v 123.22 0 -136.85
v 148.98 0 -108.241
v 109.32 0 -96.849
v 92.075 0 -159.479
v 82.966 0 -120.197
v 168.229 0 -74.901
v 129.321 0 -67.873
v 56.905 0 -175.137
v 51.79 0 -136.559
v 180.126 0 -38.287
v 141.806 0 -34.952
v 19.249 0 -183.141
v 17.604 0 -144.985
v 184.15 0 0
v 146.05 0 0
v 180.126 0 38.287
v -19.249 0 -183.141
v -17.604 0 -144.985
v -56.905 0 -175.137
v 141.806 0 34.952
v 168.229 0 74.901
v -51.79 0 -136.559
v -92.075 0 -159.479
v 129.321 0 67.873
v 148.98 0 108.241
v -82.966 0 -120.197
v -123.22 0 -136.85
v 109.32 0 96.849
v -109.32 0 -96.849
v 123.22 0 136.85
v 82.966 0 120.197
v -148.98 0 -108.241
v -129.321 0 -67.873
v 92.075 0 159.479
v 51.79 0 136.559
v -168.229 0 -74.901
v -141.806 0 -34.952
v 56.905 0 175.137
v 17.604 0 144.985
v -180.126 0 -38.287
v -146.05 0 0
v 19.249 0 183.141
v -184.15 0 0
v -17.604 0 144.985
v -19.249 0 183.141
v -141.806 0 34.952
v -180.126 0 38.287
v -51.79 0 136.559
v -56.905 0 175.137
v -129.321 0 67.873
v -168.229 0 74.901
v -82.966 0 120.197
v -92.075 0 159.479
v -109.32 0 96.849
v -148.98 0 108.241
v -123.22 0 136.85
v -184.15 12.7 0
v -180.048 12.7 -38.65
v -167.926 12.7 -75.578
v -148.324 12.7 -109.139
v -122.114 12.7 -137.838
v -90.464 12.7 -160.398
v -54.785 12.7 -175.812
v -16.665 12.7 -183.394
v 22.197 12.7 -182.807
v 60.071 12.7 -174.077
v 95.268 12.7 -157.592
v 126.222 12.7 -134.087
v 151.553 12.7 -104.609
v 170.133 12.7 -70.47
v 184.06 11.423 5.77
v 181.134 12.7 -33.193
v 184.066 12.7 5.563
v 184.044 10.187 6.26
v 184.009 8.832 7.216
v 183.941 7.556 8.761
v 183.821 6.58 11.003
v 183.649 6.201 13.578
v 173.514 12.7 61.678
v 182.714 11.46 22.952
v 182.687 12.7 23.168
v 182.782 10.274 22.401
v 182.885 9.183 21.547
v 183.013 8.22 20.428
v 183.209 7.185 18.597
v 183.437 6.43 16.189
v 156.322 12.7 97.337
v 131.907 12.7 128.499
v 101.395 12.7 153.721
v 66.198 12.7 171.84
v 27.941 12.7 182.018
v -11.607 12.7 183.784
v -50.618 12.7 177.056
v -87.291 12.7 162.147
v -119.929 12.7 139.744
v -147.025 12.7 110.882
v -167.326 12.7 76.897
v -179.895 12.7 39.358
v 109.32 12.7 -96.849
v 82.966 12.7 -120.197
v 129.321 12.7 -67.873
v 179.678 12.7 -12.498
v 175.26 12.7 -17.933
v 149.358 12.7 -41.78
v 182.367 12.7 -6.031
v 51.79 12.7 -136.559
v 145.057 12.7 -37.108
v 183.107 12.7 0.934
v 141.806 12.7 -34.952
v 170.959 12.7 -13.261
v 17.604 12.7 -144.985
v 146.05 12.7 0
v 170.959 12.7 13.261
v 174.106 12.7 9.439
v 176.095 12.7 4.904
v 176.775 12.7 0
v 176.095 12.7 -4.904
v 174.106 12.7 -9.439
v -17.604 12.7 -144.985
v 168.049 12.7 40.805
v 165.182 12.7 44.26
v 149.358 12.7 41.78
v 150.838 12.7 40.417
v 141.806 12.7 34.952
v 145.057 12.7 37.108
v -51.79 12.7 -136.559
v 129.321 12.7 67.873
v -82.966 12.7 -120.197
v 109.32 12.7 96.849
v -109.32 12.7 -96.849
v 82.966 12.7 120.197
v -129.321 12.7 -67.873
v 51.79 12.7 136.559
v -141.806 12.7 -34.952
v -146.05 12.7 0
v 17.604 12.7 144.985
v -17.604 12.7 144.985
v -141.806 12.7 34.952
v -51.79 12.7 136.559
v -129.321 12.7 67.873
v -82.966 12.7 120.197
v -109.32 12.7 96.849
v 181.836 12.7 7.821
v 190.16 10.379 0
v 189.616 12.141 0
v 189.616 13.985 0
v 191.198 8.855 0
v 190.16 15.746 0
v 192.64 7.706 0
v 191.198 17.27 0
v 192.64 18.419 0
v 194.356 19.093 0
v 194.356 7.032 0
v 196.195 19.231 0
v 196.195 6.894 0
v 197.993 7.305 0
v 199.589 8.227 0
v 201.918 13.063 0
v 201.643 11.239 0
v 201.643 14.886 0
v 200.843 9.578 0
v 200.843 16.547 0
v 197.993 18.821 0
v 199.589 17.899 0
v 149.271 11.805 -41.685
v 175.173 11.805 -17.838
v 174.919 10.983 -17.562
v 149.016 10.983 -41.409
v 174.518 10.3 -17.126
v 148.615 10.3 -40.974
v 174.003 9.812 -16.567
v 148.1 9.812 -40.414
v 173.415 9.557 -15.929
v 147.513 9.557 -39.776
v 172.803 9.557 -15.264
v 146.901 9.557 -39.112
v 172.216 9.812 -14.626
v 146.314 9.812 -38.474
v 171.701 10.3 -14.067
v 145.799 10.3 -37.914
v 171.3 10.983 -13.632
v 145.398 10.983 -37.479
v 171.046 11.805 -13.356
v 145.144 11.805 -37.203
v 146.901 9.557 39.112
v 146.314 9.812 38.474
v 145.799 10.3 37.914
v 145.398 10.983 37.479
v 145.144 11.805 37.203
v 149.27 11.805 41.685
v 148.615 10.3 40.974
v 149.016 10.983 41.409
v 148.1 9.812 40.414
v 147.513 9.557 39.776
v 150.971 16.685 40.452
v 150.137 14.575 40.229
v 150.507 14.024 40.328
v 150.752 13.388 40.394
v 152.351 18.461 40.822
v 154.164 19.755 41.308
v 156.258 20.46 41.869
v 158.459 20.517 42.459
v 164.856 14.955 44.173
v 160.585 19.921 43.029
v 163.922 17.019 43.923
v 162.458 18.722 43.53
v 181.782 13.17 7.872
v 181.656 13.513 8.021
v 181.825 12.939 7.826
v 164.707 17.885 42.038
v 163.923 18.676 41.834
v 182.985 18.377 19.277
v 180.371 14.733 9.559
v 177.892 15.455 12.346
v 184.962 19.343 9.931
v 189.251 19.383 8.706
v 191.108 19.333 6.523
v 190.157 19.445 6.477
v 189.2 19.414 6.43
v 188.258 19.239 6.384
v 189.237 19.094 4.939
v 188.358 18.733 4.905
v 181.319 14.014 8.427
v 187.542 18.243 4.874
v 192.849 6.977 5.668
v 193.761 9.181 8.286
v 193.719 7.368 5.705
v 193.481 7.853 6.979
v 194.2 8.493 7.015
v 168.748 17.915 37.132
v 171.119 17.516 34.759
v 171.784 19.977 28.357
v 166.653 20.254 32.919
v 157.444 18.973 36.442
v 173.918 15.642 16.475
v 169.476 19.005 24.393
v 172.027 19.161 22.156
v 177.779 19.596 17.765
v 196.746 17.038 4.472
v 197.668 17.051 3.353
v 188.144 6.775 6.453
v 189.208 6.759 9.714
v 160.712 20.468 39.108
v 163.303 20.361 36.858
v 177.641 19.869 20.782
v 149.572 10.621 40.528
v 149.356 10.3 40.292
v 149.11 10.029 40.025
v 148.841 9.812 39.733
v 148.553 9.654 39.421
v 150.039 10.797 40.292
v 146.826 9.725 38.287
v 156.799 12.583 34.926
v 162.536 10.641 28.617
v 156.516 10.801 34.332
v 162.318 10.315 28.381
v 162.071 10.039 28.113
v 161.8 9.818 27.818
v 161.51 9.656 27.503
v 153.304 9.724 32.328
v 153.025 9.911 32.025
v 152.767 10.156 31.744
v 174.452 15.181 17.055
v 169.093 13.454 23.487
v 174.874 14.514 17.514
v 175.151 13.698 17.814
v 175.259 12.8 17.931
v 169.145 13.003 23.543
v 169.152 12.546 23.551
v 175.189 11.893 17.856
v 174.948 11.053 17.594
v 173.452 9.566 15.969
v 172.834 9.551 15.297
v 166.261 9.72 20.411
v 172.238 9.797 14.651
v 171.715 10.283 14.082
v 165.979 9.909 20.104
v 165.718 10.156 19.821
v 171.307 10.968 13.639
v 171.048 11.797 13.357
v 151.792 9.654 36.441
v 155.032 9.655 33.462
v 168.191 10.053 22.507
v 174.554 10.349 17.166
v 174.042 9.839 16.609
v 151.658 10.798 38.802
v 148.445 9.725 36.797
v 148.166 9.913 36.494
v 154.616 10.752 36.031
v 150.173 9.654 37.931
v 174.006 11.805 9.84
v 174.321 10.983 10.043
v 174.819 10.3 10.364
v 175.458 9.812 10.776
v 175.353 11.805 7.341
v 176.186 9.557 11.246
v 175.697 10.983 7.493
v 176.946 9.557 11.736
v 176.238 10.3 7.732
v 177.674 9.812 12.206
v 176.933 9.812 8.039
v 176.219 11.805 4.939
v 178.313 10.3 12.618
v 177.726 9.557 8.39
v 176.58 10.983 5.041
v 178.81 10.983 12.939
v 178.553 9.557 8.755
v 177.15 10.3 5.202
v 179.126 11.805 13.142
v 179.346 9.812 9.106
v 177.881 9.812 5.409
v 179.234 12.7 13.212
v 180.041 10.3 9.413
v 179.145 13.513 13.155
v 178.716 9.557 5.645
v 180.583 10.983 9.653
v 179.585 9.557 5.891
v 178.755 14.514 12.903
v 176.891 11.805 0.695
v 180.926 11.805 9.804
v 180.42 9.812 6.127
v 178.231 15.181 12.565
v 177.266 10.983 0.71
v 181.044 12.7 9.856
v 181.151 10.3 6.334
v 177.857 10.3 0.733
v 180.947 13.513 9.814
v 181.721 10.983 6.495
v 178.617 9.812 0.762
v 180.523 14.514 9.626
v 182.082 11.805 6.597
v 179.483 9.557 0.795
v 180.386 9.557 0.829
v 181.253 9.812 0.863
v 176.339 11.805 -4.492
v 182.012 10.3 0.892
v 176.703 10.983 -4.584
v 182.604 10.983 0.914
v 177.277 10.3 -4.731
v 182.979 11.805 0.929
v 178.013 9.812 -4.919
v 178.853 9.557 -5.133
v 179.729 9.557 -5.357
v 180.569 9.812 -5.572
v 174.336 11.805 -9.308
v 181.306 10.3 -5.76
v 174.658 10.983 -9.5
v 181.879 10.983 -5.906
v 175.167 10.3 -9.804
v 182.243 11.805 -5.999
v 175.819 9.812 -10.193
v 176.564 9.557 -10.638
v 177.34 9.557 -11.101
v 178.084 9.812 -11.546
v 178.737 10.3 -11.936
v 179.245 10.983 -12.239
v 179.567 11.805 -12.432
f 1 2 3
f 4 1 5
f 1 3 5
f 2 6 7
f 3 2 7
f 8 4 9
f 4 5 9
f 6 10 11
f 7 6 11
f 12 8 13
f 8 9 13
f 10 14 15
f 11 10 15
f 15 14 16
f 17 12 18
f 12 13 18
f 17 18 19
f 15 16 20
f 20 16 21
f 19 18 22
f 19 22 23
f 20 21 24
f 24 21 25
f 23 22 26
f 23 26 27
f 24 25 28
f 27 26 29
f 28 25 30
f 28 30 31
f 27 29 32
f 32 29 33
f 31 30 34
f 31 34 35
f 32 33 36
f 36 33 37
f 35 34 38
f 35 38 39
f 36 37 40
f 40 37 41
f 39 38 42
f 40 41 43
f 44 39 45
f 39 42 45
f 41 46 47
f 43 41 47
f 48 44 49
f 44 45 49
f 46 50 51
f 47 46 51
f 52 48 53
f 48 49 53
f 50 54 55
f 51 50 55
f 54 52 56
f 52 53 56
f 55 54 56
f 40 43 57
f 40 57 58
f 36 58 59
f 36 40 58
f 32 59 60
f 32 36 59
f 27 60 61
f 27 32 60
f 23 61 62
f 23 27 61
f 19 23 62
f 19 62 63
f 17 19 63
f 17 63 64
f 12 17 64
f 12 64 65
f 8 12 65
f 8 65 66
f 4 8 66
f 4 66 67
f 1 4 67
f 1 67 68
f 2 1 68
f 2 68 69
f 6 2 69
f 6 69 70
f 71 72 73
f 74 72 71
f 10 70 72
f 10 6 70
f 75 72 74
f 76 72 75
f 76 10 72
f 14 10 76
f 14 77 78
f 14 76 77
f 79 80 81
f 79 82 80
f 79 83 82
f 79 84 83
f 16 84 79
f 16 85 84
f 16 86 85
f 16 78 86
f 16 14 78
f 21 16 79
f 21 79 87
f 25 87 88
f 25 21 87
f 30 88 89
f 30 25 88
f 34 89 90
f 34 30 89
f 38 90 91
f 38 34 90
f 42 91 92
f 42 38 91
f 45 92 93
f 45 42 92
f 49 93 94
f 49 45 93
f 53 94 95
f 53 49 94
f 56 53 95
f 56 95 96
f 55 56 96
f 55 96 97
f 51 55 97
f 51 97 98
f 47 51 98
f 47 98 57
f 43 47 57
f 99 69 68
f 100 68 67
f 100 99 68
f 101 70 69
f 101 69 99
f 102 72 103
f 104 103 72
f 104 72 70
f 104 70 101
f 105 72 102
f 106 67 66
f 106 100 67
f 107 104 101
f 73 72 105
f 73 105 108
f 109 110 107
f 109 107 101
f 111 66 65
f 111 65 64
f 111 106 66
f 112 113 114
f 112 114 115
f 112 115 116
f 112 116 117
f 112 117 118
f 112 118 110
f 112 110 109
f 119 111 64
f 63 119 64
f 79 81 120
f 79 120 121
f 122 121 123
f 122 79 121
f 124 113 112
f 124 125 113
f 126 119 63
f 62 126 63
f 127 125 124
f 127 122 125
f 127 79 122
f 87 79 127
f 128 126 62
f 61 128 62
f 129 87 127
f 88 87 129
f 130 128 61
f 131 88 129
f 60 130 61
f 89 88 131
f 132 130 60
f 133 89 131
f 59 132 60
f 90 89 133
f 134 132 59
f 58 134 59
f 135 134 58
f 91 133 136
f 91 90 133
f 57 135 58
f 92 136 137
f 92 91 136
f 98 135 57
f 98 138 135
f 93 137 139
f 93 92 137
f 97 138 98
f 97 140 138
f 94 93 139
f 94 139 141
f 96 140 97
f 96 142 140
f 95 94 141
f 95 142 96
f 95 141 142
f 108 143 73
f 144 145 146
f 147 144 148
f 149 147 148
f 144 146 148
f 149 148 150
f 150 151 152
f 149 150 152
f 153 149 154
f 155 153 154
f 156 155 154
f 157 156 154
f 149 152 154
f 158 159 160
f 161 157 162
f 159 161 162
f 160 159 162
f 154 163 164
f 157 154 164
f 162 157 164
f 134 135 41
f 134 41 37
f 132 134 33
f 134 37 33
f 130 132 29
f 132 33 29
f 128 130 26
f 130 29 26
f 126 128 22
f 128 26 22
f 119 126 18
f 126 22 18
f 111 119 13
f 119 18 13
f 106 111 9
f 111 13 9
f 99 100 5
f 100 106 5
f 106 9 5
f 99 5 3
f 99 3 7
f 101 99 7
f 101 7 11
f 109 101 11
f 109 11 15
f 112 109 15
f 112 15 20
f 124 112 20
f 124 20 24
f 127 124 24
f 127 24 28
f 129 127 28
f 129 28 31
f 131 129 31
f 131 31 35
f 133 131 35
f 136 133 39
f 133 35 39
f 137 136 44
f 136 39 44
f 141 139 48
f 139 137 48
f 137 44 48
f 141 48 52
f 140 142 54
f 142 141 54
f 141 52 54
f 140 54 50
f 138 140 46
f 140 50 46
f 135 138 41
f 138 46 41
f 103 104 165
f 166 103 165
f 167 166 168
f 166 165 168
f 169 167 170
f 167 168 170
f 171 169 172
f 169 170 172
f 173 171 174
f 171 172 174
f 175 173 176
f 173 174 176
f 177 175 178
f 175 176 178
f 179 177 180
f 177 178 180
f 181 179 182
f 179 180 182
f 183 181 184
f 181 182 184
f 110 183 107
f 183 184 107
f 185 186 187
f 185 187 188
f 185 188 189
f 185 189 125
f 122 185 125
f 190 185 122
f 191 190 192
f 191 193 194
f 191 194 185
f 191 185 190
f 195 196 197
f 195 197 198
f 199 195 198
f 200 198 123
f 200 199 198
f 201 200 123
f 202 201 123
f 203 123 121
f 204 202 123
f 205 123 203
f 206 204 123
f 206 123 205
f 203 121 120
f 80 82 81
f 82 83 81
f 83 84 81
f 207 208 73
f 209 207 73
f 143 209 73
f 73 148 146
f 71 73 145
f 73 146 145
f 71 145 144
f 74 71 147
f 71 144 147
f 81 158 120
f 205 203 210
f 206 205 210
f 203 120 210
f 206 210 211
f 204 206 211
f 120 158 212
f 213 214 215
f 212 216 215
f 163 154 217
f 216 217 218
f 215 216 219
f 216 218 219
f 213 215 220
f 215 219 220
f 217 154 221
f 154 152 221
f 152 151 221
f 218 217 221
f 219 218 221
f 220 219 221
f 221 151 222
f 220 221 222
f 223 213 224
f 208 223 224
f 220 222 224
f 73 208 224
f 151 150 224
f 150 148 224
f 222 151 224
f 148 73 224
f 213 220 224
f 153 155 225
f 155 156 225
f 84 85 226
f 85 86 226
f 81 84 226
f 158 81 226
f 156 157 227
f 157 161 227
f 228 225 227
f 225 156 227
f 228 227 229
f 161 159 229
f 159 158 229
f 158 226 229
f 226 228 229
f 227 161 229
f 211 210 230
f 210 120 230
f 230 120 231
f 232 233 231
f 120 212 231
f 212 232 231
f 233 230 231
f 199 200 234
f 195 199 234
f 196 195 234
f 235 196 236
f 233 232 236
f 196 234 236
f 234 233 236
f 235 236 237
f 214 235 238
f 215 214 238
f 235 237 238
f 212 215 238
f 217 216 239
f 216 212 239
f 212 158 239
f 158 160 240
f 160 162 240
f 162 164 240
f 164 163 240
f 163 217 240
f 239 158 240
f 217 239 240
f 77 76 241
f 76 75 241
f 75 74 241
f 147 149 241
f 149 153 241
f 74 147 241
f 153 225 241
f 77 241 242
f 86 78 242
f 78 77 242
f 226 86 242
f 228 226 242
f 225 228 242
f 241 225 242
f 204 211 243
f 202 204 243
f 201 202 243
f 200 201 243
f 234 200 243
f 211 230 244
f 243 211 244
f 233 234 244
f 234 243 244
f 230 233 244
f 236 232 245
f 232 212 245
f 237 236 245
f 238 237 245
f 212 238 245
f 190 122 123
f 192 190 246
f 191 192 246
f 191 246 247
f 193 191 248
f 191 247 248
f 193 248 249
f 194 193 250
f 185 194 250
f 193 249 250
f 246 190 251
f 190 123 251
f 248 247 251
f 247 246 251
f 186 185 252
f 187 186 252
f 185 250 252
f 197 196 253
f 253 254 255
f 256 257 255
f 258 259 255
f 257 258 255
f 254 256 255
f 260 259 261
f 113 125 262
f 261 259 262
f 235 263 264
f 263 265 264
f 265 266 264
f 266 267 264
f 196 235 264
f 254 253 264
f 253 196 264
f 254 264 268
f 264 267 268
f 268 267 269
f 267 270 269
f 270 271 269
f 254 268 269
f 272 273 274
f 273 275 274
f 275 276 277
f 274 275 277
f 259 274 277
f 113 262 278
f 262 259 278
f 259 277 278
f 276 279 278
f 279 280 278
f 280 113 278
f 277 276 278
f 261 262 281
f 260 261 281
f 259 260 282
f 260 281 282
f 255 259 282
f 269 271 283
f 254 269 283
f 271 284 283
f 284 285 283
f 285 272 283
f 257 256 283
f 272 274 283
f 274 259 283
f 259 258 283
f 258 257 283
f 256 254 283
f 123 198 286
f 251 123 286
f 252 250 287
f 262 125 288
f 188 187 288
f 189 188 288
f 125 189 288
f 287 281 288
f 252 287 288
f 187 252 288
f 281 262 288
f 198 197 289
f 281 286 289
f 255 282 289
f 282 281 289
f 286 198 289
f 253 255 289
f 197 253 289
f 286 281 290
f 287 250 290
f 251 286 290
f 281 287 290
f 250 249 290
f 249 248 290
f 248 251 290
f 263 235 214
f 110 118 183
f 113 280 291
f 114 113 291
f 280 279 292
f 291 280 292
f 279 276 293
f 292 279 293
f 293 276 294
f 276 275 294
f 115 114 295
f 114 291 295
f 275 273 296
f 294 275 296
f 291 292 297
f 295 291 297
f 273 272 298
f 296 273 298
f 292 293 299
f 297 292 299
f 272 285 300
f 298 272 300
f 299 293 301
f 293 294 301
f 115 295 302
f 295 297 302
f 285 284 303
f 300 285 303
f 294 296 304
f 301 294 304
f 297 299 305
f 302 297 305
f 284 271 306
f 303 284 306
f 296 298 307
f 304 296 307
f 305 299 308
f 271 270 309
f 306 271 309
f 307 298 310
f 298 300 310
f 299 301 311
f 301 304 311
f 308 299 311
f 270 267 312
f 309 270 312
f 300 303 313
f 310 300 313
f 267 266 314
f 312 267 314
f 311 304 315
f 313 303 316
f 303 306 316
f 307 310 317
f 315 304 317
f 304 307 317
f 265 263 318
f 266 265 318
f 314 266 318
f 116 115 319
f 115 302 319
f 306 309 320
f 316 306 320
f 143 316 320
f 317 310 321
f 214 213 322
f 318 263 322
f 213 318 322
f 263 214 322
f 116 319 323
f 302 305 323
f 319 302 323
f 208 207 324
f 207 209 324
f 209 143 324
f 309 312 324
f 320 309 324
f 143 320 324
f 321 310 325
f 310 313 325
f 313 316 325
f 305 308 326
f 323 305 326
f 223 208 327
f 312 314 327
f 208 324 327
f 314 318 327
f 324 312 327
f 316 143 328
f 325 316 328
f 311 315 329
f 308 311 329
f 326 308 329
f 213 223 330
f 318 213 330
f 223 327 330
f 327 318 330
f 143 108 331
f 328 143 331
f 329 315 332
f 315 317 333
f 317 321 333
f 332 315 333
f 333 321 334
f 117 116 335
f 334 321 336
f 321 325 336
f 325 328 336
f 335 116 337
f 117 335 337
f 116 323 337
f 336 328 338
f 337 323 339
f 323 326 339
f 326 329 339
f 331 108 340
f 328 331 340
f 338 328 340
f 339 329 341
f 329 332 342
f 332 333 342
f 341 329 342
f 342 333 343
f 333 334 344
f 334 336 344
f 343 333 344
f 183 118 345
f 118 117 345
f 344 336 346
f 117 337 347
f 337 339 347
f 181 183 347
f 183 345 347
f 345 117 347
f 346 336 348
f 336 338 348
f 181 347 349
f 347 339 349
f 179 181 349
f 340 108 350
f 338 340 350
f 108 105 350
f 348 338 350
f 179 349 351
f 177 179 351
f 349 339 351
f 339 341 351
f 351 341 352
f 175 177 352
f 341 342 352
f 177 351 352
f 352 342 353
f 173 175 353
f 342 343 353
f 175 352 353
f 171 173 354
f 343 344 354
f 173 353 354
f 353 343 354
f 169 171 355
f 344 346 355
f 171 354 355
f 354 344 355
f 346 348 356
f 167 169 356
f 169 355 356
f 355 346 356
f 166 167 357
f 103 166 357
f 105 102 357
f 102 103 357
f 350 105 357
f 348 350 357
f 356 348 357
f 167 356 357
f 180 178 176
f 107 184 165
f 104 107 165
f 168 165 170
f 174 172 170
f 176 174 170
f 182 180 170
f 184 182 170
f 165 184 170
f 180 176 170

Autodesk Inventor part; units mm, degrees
ref_plane "XZ Plane" through (0, 0, 0) normal (0, 1, 0) x (-1, 0, 0)
sketch "Sketch1" plane through (0, 0, 0) normal (0, 1, 0) x (-1, 0, 0)
  circle A0 centre (0, 0) radius 146.05
  circle A1 centre (0, 0) radius 184.15
  dimension "camInsideDiameter" = 292.1
  dimension "d1" = 368.3
extrude "Extrusion1" add sketch "Sketch1" along normal blind 12.7
sketch "Sketch2" plane through (0, 12.7, 0) normal (0, 1, 0) x (1, 0, 0)
  circle A0 centre (0, 0) radius 146.05 construction
  circle A1 centre (0, 0) radius 184.15 construction
  line L0 (0, 0) -> (147.2071, -39.444) construction
  line L1 (0, 0) -> (184.15, 0) construction
  line L2 (0, 0) -> (147.2071, 39.444) construction
  line L3 (147.2071, -39.444) -> (173.1094, -15.5967)
  line L4 (147.2071, 39.444) -> (173.1094, 15.5967)
  arc A2 (173.1094, -15.5967) -> (173.1094, 15.5967) centre (158.75, 0) ccw
  dimension "oneHalfPhase" = 15
  dimension "d5" = 15
  dimension "innerRadiusForCam" = 152.4
  dimension "innerRadisuForCam" = 152.4
  dimension "d12" = 158.75
sketch "Sketch8" plane through (0, 12.7, 0) normal (0, 1, 0) x (1, 0, 0)
  line L0 (0, 0) -> (184.15, 0) construction
  circle A0 centre (0, 0) radius 184.15 construction
  line L1 (0, 0) -> (177.8752, 47.6615) construction
  line L2 (0, 0) -> (47.6615, 177.8752) construction
  line L3 (0, 0) -> (0, 184.15) construction
  line L4 (0, 0) -> (177.8752, -47.6615) construction
  circle A1 centre (0, 0) radius 155.8689 construction
  circle A2 centre (0, 0) radius 173.9571 construction
  point P0 (150.5578, 40.3418)
  point P1 (168.0296, 45.0234)
  dimension "angleForCamMovement" = 15
  dimension "d17" = 15
  dimension "d18" = 15
sketch "Sketch9" plane through (0, 0, 0) normal (0, 0, 1) x (1, 0, 0)
  circle A0 centre (195.7327, 13.0626) radius 6.1855
  line L0 (-146.05, 12.7) -> (146.05, 12.7) projected
  point P0 (0, 0)
  dimension "d22" = 0.3625
ref_plane "Work Plane2" through (0, 12.7, 0) normal (-0.2588, 0, 0.9659) x (0.9659, 0, 0.2588)
ref_plane "Work Plane3" through (0, 12.7, 0) normal (0.2588, 0, 0.9659) x (0.9659, 0, -0.2588)
ref_plane "Work Plane4" through (0, 12.7, 0) normal (0.9659, 0, 0.2588) x (0.2588, 0, -0.9659)
sketch "Sketch11" plane through (0, 12.7, 0) normal (-0.2588, 0, 0.9659) x (0.9659, 0, 0.2588)
  circle A0 centre (163.1045, -0.0307) radius 7.9043
  point P0 (0, -12.7)
loft "Loft1" add profiles "Sketch11", "Sketch9"
sketch "Sketch7" plane through (0, 12.7, 0) normal (0, 1, 0) x (1, 0, 0)
  circle A0 centre (0, 0) radius 153.9875
  circle A1 centre (0, 0) radius 174.625
  line L0 (0, 0) -> (184.15, 0) construction
  circle A2 centre (0, 0) radius 184.15 construction
  line L1 (0, 0) -> (177.8752, 47.6615) construction
  arc A3 (174.625, 0) -> (148.7405, 39.8549) centre (134.2536, 2.1131) ccw
  arc A4 (148.7405, -39.8549) -> (174.625, 0) centre (134.2536, -2.1131) ccw
  dimension "d13" = 349.25
  dimension "d14" = 307.975
  dimension "d15" = 15
ref_plane "Work Plane1" through (147.2071, 12.7, 39.444) normal (0.7357, 0, -0.6773) x (0, 1, 0)
sketch "Sketch4" plane through (147.2071, 12.7, 39.444) normal (0.7357, 0, -0.6773) x (0, 1, 0)
  circle A0 centre (0, 0) radius 3.175
  point P0 (-12.7, -128.725)
  dimension "d9" = 6.35
sweep "Sweep1" cut profiles "Sketch4" path "Sketch2"
equation "\"innerRadiusForCam\" = innerRadisuForCam"
equation "\"d17\" = angleForCamMovement"
equation "\"d18\" = angleForCamMovement"
equation "\"d5\" = oneHalfPhase"
properties part number "DiskCam" material "PC/ABS Plastic"
